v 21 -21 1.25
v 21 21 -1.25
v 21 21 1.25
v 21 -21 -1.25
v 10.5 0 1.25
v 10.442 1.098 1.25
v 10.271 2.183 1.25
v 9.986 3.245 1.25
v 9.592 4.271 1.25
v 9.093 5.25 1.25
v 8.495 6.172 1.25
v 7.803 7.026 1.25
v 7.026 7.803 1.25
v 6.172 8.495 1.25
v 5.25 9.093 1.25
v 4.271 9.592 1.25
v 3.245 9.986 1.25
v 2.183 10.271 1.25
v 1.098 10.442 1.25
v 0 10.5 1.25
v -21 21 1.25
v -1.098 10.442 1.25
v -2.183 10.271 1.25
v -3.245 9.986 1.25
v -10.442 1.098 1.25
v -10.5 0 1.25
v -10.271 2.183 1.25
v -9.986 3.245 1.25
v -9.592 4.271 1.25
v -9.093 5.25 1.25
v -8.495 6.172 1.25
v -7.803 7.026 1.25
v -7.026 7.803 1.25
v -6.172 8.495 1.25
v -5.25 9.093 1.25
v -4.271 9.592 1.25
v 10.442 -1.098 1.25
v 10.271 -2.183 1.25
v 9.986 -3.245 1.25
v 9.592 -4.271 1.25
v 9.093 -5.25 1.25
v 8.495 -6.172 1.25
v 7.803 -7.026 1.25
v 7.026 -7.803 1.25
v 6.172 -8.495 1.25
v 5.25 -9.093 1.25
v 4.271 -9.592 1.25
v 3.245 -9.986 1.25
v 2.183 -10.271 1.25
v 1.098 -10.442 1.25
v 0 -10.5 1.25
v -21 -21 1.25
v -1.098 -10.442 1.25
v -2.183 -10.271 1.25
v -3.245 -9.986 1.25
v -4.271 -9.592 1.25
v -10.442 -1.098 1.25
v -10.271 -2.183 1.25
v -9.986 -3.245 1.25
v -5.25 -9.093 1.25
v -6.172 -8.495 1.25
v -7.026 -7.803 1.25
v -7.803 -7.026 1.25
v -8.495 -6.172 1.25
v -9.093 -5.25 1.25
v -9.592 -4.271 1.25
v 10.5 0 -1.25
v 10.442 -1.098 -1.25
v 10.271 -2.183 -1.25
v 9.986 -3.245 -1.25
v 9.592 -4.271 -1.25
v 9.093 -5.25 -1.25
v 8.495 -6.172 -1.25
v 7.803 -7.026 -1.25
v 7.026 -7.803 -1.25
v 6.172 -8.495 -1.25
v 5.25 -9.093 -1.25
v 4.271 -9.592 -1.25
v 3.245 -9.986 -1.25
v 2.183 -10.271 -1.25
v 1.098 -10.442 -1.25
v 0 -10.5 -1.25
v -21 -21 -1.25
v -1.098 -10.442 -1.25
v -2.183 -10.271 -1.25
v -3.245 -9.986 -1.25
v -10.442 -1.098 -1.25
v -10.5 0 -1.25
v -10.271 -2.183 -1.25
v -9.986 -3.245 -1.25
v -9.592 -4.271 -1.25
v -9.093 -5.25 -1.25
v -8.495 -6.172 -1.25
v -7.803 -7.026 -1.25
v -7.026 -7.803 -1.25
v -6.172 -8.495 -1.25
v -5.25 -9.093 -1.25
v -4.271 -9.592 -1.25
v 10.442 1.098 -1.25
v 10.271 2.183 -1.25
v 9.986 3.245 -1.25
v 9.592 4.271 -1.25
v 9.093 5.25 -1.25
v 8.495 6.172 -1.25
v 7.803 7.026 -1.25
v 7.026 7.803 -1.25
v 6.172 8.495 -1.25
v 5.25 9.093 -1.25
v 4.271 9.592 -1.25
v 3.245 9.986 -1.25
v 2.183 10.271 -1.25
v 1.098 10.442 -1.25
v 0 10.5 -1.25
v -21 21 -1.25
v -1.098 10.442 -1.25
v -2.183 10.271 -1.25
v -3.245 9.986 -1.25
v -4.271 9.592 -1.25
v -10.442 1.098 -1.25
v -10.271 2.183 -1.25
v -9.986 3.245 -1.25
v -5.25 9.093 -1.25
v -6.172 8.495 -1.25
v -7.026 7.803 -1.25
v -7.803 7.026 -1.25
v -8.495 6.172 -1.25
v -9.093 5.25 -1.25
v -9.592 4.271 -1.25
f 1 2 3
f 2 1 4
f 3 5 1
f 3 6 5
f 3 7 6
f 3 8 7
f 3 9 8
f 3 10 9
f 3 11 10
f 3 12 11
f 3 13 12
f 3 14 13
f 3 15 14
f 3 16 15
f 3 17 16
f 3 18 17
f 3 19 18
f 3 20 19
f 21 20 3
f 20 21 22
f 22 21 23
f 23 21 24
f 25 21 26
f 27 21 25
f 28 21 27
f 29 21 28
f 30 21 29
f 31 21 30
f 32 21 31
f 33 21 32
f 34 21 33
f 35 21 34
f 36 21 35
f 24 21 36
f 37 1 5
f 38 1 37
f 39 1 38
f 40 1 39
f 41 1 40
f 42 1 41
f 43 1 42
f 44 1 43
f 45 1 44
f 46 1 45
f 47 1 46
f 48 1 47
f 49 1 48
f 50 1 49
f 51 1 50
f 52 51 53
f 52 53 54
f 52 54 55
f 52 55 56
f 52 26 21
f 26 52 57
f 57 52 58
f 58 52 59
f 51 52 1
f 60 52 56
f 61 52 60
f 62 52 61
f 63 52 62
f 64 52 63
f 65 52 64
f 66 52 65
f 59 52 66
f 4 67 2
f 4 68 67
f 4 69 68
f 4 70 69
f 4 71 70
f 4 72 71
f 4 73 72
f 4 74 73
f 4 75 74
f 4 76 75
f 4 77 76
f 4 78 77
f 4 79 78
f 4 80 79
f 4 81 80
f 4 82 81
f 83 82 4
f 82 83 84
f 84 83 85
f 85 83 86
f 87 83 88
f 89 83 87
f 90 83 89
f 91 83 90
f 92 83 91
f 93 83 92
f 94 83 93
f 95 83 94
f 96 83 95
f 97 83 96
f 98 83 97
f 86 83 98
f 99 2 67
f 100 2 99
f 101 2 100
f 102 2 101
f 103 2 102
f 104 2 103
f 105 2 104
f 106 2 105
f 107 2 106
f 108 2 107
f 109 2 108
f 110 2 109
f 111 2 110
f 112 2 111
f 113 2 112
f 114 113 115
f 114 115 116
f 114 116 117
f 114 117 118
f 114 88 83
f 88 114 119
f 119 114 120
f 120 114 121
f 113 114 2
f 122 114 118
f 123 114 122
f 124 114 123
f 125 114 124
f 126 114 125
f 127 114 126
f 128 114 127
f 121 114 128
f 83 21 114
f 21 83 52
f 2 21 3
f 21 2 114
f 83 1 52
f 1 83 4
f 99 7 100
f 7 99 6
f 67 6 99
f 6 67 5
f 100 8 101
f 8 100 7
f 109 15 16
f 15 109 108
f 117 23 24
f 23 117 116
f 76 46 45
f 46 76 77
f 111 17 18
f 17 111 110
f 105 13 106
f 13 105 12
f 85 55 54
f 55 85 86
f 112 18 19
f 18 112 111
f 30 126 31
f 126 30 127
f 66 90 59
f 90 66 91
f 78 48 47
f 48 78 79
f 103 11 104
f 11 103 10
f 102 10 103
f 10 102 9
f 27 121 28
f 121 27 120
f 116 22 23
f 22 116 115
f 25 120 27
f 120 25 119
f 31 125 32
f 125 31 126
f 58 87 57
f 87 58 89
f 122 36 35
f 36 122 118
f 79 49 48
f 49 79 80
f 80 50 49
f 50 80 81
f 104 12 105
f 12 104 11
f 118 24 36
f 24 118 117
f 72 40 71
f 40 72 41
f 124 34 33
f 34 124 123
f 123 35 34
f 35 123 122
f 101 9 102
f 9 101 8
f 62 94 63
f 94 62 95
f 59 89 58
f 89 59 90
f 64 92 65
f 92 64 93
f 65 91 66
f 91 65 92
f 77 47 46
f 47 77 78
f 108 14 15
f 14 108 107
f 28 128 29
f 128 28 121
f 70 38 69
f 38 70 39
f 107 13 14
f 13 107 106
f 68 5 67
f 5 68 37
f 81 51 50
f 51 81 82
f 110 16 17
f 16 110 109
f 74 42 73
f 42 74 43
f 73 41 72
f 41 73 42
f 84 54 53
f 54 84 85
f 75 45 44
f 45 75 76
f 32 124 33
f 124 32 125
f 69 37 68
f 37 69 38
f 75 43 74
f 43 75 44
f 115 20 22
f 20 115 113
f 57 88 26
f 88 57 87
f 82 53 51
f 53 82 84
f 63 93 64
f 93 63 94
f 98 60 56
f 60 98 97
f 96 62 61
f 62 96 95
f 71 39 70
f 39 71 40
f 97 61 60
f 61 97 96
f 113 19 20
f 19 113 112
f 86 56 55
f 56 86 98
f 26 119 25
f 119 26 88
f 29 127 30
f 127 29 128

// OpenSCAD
// Square mounting washer.
$fn = 60;
eps = 0.02;
hole_d = 21;
side = 42;
thickness = 2.5;
difference() {
    cube([side,side,thickness],center=true);
    translate([0,0,-thickness/2-eps]) cylinder(d=hole_d,h=thickness+2*eps);
}
